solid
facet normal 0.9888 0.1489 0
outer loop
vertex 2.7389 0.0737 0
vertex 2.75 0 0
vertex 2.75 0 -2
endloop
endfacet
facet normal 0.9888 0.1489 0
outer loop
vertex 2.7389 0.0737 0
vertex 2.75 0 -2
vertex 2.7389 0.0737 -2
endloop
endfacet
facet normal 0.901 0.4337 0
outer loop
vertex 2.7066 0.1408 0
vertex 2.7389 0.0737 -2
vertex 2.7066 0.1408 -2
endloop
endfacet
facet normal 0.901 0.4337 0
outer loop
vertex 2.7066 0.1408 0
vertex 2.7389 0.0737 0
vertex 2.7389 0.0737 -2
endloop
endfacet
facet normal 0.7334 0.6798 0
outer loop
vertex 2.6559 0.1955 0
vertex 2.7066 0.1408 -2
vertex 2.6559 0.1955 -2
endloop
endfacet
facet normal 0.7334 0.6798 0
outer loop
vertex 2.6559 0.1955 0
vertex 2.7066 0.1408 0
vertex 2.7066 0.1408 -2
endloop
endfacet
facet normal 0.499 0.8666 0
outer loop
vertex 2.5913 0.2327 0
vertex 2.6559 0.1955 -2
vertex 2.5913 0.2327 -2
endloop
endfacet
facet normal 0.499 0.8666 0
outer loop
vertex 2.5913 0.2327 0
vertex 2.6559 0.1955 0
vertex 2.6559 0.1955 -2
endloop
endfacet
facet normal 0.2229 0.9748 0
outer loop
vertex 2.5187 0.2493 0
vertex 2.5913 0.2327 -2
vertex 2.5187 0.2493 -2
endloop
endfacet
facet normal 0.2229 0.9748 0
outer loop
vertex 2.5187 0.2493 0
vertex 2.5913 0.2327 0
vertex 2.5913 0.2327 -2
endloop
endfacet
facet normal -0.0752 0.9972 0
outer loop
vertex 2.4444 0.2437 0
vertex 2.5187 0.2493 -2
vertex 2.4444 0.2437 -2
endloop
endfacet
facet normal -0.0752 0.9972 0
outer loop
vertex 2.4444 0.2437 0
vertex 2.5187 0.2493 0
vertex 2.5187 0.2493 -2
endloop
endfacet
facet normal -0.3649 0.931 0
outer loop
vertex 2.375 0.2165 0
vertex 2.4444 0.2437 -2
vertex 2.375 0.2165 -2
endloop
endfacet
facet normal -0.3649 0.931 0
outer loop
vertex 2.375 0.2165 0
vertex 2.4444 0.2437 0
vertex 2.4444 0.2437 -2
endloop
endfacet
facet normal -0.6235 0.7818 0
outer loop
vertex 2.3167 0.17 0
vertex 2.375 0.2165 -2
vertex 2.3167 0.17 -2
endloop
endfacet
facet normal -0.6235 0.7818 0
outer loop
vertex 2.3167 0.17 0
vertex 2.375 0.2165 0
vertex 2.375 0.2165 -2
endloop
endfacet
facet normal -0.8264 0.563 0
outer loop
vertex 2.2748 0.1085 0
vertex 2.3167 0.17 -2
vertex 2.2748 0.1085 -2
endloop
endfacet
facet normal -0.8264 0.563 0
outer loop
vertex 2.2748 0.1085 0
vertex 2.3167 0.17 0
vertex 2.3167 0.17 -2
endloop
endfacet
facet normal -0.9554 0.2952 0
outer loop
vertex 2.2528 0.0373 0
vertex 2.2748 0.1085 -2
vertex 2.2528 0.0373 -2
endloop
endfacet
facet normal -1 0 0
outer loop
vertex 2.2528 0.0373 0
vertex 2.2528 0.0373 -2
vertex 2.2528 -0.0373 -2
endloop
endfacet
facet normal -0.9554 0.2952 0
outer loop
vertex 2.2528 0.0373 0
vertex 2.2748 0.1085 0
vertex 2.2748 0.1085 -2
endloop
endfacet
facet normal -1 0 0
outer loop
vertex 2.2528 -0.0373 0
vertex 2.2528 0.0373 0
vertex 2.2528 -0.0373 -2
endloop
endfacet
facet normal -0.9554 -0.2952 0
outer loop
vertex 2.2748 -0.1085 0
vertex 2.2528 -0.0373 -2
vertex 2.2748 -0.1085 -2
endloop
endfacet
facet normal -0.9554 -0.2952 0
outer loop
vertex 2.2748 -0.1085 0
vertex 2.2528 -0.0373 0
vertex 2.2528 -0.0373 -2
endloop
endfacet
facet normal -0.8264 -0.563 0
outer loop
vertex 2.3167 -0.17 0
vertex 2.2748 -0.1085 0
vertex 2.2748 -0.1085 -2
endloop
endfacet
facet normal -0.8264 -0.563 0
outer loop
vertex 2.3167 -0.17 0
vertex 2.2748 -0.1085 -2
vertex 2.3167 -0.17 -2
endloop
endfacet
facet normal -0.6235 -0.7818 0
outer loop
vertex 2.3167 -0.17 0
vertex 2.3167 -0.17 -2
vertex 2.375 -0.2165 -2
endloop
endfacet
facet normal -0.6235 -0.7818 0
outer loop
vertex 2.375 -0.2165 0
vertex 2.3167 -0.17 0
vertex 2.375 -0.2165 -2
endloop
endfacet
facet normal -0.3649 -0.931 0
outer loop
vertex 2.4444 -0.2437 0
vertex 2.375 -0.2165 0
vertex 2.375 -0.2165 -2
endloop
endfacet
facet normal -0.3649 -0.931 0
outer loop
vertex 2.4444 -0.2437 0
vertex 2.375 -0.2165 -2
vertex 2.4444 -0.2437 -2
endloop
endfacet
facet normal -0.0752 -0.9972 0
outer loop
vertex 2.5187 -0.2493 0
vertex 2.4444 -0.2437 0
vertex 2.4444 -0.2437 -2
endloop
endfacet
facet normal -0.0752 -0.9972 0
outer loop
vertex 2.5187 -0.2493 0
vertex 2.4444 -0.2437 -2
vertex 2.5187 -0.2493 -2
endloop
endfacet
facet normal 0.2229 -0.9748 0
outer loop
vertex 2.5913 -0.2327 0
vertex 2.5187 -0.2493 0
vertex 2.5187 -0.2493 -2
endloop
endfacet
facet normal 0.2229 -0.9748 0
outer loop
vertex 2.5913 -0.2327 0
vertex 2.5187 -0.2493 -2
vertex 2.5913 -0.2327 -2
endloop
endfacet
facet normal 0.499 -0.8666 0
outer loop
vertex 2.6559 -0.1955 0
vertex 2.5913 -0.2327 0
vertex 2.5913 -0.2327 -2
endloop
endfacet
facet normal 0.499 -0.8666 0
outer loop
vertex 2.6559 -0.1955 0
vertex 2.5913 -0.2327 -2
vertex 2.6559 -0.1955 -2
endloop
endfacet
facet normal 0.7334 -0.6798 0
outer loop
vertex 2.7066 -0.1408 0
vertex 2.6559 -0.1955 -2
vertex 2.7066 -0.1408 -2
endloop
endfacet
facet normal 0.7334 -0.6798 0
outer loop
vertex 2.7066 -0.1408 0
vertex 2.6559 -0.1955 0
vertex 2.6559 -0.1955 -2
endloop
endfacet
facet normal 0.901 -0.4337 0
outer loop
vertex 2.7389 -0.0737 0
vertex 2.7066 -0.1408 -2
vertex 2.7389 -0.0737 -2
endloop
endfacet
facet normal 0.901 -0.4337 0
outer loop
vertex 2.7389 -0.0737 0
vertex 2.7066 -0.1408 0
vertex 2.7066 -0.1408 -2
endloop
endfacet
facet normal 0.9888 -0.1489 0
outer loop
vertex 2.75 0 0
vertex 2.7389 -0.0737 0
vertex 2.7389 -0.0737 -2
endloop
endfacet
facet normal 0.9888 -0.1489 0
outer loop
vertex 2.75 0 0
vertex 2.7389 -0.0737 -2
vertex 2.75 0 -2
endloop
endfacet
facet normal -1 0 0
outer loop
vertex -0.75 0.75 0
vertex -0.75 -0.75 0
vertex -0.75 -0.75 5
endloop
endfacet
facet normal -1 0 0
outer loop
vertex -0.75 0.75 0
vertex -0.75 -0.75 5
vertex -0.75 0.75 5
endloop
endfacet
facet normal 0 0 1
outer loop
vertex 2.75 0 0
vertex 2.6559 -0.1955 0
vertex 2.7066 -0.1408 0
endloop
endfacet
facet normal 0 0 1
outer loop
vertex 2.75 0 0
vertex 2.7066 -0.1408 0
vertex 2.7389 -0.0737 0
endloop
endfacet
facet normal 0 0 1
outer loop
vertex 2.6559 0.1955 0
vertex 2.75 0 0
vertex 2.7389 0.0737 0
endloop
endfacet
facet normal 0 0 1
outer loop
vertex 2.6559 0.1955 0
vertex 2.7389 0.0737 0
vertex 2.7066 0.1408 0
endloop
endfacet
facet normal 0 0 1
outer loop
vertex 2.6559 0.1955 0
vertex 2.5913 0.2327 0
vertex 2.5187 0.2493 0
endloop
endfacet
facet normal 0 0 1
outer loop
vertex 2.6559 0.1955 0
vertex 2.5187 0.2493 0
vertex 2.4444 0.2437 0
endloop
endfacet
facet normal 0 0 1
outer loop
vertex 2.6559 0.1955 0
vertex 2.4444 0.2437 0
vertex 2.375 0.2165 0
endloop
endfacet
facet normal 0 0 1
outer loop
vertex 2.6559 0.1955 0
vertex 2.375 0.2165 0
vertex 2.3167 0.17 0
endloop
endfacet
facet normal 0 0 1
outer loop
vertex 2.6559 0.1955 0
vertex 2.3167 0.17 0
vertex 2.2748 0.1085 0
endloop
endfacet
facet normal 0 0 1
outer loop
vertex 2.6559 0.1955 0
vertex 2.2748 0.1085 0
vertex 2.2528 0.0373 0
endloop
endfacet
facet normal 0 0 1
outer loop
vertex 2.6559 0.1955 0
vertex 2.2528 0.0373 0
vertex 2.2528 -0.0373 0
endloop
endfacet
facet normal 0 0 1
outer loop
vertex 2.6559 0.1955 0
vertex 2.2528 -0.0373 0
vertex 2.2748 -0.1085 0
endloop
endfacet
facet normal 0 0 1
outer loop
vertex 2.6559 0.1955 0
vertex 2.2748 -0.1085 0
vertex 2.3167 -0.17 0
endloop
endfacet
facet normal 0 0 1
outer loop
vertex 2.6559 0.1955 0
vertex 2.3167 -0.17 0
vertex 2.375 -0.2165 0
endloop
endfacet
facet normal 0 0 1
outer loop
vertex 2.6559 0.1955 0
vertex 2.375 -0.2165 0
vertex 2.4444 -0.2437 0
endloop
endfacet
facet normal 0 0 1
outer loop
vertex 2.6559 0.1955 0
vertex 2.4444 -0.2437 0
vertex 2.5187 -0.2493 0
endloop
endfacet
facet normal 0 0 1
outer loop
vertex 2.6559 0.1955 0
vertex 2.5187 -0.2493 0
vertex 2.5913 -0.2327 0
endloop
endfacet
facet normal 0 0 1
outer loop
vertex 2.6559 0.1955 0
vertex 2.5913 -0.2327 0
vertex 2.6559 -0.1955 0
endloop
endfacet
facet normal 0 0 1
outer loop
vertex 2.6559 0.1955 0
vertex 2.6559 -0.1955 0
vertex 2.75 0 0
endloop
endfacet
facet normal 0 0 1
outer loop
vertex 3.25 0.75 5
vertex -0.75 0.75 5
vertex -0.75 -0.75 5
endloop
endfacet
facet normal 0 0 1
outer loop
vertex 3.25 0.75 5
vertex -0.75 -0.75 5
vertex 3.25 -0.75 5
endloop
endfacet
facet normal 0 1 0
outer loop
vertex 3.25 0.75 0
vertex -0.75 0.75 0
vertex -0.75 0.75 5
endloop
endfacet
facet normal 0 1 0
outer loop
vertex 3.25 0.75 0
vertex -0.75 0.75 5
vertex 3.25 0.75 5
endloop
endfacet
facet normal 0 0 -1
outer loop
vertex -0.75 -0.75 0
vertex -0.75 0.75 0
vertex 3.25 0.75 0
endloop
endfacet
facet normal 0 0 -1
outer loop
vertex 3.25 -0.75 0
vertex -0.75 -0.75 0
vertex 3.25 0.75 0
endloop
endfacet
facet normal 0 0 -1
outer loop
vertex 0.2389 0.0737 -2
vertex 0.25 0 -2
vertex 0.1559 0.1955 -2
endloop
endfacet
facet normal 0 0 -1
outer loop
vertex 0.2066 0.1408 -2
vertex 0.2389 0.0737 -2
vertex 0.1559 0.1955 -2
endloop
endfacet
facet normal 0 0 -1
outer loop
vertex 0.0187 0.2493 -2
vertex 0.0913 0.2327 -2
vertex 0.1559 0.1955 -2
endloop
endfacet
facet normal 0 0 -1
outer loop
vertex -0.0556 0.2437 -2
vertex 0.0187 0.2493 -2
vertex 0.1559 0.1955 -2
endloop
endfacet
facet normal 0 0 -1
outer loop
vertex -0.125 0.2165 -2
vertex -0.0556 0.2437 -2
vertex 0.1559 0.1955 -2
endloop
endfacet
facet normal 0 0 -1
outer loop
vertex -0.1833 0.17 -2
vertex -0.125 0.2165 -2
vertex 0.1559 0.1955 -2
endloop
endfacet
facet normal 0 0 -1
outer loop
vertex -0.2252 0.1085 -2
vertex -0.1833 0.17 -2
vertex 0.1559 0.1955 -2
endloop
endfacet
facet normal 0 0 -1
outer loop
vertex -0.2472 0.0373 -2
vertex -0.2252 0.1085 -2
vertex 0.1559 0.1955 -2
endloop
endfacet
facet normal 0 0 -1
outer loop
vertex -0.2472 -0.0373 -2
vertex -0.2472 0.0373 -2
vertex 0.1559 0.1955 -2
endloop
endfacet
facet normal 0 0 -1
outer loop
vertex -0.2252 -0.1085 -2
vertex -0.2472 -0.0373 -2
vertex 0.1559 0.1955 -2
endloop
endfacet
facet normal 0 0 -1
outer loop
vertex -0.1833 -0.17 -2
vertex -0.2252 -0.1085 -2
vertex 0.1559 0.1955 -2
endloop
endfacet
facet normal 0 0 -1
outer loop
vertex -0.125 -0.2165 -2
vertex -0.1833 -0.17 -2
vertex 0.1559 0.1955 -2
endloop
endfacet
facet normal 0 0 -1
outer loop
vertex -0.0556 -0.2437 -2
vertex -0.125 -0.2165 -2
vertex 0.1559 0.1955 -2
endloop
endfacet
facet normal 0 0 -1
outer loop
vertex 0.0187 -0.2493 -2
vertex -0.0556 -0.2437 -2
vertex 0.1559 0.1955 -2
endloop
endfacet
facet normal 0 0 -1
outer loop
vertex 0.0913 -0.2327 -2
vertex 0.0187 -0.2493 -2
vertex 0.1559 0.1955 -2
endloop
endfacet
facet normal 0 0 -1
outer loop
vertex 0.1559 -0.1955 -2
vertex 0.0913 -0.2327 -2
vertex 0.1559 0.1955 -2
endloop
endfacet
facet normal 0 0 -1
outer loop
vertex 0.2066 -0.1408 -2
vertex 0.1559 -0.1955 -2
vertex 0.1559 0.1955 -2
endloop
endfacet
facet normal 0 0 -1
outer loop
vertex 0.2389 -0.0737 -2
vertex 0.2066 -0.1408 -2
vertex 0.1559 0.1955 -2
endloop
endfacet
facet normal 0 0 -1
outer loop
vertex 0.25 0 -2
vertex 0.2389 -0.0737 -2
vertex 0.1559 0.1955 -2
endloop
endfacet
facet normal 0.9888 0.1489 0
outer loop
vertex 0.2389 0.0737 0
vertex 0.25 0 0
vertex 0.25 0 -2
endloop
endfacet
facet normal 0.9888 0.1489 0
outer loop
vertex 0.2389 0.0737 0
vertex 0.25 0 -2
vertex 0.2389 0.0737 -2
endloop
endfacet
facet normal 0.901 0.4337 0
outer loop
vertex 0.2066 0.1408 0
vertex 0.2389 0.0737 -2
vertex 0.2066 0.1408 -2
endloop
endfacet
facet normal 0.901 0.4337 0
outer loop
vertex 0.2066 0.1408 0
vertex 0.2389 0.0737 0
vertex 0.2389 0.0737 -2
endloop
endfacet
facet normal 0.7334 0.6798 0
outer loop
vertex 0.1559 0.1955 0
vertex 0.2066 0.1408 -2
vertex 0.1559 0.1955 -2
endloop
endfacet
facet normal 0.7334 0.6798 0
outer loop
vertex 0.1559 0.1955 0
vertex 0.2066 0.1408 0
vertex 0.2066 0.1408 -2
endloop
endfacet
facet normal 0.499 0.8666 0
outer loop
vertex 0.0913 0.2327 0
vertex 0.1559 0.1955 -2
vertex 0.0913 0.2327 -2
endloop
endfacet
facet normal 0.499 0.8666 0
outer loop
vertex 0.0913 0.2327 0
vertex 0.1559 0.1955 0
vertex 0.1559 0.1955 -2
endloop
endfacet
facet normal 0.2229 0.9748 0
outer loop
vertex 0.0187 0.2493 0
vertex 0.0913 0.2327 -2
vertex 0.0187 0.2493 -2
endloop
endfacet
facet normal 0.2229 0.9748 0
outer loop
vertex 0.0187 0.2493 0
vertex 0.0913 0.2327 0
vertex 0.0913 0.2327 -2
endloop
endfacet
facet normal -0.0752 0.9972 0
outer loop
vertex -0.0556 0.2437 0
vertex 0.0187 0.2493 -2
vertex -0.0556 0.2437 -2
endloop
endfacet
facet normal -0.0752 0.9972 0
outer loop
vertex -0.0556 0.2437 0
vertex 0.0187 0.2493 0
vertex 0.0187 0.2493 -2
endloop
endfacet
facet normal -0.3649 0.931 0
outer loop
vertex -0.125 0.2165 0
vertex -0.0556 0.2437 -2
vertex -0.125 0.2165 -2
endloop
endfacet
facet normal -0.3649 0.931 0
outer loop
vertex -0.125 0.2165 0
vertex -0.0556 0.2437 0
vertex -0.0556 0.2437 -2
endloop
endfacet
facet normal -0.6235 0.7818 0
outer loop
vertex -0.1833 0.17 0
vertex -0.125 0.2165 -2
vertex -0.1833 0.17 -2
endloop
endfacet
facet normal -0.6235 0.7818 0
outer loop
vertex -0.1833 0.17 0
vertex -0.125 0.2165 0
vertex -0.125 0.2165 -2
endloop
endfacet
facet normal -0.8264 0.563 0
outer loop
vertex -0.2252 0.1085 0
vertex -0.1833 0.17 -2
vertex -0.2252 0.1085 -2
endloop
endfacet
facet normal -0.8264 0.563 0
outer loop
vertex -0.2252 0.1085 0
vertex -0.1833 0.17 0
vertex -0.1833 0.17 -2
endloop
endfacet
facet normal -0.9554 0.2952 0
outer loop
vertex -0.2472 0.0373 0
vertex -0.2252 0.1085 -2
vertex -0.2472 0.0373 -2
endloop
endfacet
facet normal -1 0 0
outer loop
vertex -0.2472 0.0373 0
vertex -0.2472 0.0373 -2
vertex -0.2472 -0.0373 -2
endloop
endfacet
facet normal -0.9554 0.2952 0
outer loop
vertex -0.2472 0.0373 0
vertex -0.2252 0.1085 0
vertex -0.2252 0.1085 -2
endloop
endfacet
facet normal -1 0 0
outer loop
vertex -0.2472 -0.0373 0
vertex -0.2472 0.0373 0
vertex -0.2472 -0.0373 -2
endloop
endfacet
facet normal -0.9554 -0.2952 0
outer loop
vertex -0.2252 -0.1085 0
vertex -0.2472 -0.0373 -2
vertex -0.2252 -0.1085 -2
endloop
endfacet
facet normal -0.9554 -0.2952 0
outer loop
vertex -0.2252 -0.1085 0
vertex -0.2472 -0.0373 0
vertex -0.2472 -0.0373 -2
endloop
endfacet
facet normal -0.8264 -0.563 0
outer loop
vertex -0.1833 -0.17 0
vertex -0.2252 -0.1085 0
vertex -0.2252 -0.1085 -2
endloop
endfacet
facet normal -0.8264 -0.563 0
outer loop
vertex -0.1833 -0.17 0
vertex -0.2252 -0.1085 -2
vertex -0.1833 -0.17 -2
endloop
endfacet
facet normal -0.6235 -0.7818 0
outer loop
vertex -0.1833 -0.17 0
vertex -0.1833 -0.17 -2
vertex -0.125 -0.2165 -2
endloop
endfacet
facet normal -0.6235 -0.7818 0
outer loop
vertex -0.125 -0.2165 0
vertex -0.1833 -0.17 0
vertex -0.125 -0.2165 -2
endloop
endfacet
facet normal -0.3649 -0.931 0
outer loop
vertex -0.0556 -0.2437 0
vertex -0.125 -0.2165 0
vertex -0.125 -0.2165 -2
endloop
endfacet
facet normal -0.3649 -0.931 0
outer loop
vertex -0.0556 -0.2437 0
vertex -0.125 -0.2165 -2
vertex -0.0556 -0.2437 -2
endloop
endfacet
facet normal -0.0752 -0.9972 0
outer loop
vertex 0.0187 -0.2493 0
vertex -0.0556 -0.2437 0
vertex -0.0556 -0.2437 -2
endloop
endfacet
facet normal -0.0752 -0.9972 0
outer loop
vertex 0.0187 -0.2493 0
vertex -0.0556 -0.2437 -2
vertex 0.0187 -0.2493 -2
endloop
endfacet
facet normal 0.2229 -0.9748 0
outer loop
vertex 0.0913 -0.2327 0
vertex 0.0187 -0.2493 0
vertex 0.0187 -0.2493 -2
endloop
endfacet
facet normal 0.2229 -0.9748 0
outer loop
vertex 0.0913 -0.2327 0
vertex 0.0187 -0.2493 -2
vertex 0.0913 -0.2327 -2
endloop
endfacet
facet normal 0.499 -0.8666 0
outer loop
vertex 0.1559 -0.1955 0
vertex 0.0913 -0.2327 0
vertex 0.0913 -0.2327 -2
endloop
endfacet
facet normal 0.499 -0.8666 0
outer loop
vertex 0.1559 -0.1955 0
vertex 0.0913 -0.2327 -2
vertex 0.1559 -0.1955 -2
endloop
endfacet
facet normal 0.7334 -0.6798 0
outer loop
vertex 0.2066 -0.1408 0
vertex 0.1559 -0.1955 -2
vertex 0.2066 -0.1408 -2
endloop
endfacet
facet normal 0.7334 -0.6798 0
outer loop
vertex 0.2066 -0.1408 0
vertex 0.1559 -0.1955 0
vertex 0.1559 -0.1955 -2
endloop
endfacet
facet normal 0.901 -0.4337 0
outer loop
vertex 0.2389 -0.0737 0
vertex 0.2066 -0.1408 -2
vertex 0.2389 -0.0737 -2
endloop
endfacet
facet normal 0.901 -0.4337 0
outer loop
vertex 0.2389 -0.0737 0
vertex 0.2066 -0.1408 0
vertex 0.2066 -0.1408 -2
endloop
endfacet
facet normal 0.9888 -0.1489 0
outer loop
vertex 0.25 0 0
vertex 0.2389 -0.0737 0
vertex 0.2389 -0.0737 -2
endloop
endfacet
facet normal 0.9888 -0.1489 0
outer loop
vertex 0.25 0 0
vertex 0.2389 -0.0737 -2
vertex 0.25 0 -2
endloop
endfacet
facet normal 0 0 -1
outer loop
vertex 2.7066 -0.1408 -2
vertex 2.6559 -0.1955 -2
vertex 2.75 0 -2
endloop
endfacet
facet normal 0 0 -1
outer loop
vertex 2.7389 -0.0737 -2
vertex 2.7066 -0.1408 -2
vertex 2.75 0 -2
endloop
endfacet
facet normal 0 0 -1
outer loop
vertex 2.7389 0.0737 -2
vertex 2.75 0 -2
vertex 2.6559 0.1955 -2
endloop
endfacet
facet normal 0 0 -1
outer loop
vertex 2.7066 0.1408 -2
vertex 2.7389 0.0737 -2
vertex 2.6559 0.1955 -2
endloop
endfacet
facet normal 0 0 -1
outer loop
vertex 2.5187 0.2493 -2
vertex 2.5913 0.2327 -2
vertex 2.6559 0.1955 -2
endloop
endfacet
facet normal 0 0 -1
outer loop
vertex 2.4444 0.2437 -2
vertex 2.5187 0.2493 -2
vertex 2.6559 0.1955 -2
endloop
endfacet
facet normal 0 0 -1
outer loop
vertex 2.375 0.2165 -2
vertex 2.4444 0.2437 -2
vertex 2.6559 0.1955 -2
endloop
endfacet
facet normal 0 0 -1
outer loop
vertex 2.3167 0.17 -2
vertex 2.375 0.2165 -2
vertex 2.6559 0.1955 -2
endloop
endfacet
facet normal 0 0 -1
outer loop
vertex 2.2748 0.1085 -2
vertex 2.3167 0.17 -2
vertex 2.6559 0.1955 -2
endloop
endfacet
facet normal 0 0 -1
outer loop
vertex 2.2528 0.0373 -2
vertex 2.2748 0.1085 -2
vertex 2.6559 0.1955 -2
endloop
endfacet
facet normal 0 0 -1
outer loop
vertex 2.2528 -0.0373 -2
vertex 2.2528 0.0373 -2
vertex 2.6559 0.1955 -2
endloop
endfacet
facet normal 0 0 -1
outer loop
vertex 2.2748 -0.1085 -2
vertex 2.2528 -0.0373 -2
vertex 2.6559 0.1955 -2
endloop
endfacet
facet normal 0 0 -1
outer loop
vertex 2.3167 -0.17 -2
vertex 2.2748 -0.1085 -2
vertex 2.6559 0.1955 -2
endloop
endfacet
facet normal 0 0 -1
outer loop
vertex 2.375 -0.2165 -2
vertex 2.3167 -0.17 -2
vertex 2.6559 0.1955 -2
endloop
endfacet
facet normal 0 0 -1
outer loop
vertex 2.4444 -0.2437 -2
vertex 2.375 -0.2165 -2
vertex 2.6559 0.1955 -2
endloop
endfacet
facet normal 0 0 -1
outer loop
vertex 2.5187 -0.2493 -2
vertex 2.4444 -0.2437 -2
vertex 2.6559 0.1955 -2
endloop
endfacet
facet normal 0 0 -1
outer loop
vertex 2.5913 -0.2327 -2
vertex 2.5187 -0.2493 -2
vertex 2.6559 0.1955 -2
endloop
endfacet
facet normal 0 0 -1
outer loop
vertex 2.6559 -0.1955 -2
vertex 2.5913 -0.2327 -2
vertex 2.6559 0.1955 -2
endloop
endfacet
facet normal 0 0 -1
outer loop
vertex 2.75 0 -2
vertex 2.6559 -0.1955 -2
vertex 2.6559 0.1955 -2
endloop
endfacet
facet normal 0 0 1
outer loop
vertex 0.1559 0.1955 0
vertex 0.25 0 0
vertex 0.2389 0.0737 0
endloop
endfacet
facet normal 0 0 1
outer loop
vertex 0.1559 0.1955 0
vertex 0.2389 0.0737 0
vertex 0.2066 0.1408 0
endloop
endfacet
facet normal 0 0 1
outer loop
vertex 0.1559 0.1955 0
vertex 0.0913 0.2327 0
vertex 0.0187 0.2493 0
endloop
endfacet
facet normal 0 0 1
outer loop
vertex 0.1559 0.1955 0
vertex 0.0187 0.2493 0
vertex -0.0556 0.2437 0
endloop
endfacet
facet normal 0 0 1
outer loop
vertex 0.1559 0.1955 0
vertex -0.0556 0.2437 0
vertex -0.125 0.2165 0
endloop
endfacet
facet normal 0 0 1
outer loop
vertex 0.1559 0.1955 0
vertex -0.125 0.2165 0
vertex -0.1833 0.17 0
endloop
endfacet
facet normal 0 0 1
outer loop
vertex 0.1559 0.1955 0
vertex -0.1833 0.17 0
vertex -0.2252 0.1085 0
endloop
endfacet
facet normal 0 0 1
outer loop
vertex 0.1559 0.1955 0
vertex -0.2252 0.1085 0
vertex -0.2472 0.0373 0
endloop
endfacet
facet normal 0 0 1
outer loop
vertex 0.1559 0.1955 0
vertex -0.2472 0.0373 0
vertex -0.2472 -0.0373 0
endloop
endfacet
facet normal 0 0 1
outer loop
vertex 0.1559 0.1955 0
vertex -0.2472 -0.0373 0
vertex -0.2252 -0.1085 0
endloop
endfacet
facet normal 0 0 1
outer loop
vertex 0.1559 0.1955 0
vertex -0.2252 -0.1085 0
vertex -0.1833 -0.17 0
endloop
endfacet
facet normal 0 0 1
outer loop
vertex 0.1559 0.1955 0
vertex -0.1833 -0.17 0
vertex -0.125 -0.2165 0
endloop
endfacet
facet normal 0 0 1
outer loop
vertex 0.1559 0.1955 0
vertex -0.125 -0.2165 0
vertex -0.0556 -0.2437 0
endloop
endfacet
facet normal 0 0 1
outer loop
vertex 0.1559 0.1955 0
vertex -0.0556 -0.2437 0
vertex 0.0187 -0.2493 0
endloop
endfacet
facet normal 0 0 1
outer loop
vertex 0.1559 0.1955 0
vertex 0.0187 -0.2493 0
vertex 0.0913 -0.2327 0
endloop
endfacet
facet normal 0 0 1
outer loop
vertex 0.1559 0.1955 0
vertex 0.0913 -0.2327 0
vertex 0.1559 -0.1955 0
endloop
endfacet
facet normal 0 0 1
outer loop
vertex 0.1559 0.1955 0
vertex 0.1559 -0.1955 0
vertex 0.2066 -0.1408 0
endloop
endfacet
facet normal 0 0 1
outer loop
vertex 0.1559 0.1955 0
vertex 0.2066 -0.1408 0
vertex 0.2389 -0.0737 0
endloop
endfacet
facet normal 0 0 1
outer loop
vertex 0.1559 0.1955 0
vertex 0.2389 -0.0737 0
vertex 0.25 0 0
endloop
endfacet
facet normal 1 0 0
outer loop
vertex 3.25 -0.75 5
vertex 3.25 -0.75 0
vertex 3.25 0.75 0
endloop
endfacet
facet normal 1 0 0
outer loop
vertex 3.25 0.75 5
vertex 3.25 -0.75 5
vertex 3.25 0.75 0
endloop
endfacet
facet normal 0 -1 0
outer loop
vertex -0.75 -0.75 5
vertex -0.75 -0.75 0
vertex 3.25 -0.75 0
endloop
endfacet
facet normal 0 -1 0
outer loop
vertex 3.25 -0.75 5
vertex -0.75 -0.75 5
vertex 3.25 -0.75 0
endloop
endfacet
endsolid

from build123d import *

# Parameters (mm, degrees)
SKETCH1_W               = 4
SKETCH1_H               = 1.5
COMPONENT_OUTLINE_DEPTH = 5
SKETCH2_R               = 0.25
EXTRUDE_1_DEPTH         = 2
SKETCH3_R               = 0.25
EXTRUDE_2_DEPTH         = 2


with BuildPart() as part:
    # Sketch1 → Component_Outline (new body)
    with BuildSketch(Plane.XY):
        with Locations((1.25, 0)):
            Rectangle(SKETCH1_W, SKETCH1_H)
    extrude(amount=COMPONENT_OUTLINE_DEPTH)


with BuildPart() as body_2:
    # Sketch2 → Extrude 1 (new body)
    with BuildSketch(Plane.XY):
        Circle(SKETCH2_R)
    extrude(amount=-EXTRUDE_1_DEPTH)


with BuildPart() as body_3:
    # Sketch3 → Extrude 2 (new body)
    with BuildSketch(Plane.XY):
        with Locations((2.5, 0)):
            Circle(SKETCH3_R)
    extrude(amount=-EXTRUDE_2_DEPTH)


solid = Compound([part.part, body_2.part, body_3.part])
